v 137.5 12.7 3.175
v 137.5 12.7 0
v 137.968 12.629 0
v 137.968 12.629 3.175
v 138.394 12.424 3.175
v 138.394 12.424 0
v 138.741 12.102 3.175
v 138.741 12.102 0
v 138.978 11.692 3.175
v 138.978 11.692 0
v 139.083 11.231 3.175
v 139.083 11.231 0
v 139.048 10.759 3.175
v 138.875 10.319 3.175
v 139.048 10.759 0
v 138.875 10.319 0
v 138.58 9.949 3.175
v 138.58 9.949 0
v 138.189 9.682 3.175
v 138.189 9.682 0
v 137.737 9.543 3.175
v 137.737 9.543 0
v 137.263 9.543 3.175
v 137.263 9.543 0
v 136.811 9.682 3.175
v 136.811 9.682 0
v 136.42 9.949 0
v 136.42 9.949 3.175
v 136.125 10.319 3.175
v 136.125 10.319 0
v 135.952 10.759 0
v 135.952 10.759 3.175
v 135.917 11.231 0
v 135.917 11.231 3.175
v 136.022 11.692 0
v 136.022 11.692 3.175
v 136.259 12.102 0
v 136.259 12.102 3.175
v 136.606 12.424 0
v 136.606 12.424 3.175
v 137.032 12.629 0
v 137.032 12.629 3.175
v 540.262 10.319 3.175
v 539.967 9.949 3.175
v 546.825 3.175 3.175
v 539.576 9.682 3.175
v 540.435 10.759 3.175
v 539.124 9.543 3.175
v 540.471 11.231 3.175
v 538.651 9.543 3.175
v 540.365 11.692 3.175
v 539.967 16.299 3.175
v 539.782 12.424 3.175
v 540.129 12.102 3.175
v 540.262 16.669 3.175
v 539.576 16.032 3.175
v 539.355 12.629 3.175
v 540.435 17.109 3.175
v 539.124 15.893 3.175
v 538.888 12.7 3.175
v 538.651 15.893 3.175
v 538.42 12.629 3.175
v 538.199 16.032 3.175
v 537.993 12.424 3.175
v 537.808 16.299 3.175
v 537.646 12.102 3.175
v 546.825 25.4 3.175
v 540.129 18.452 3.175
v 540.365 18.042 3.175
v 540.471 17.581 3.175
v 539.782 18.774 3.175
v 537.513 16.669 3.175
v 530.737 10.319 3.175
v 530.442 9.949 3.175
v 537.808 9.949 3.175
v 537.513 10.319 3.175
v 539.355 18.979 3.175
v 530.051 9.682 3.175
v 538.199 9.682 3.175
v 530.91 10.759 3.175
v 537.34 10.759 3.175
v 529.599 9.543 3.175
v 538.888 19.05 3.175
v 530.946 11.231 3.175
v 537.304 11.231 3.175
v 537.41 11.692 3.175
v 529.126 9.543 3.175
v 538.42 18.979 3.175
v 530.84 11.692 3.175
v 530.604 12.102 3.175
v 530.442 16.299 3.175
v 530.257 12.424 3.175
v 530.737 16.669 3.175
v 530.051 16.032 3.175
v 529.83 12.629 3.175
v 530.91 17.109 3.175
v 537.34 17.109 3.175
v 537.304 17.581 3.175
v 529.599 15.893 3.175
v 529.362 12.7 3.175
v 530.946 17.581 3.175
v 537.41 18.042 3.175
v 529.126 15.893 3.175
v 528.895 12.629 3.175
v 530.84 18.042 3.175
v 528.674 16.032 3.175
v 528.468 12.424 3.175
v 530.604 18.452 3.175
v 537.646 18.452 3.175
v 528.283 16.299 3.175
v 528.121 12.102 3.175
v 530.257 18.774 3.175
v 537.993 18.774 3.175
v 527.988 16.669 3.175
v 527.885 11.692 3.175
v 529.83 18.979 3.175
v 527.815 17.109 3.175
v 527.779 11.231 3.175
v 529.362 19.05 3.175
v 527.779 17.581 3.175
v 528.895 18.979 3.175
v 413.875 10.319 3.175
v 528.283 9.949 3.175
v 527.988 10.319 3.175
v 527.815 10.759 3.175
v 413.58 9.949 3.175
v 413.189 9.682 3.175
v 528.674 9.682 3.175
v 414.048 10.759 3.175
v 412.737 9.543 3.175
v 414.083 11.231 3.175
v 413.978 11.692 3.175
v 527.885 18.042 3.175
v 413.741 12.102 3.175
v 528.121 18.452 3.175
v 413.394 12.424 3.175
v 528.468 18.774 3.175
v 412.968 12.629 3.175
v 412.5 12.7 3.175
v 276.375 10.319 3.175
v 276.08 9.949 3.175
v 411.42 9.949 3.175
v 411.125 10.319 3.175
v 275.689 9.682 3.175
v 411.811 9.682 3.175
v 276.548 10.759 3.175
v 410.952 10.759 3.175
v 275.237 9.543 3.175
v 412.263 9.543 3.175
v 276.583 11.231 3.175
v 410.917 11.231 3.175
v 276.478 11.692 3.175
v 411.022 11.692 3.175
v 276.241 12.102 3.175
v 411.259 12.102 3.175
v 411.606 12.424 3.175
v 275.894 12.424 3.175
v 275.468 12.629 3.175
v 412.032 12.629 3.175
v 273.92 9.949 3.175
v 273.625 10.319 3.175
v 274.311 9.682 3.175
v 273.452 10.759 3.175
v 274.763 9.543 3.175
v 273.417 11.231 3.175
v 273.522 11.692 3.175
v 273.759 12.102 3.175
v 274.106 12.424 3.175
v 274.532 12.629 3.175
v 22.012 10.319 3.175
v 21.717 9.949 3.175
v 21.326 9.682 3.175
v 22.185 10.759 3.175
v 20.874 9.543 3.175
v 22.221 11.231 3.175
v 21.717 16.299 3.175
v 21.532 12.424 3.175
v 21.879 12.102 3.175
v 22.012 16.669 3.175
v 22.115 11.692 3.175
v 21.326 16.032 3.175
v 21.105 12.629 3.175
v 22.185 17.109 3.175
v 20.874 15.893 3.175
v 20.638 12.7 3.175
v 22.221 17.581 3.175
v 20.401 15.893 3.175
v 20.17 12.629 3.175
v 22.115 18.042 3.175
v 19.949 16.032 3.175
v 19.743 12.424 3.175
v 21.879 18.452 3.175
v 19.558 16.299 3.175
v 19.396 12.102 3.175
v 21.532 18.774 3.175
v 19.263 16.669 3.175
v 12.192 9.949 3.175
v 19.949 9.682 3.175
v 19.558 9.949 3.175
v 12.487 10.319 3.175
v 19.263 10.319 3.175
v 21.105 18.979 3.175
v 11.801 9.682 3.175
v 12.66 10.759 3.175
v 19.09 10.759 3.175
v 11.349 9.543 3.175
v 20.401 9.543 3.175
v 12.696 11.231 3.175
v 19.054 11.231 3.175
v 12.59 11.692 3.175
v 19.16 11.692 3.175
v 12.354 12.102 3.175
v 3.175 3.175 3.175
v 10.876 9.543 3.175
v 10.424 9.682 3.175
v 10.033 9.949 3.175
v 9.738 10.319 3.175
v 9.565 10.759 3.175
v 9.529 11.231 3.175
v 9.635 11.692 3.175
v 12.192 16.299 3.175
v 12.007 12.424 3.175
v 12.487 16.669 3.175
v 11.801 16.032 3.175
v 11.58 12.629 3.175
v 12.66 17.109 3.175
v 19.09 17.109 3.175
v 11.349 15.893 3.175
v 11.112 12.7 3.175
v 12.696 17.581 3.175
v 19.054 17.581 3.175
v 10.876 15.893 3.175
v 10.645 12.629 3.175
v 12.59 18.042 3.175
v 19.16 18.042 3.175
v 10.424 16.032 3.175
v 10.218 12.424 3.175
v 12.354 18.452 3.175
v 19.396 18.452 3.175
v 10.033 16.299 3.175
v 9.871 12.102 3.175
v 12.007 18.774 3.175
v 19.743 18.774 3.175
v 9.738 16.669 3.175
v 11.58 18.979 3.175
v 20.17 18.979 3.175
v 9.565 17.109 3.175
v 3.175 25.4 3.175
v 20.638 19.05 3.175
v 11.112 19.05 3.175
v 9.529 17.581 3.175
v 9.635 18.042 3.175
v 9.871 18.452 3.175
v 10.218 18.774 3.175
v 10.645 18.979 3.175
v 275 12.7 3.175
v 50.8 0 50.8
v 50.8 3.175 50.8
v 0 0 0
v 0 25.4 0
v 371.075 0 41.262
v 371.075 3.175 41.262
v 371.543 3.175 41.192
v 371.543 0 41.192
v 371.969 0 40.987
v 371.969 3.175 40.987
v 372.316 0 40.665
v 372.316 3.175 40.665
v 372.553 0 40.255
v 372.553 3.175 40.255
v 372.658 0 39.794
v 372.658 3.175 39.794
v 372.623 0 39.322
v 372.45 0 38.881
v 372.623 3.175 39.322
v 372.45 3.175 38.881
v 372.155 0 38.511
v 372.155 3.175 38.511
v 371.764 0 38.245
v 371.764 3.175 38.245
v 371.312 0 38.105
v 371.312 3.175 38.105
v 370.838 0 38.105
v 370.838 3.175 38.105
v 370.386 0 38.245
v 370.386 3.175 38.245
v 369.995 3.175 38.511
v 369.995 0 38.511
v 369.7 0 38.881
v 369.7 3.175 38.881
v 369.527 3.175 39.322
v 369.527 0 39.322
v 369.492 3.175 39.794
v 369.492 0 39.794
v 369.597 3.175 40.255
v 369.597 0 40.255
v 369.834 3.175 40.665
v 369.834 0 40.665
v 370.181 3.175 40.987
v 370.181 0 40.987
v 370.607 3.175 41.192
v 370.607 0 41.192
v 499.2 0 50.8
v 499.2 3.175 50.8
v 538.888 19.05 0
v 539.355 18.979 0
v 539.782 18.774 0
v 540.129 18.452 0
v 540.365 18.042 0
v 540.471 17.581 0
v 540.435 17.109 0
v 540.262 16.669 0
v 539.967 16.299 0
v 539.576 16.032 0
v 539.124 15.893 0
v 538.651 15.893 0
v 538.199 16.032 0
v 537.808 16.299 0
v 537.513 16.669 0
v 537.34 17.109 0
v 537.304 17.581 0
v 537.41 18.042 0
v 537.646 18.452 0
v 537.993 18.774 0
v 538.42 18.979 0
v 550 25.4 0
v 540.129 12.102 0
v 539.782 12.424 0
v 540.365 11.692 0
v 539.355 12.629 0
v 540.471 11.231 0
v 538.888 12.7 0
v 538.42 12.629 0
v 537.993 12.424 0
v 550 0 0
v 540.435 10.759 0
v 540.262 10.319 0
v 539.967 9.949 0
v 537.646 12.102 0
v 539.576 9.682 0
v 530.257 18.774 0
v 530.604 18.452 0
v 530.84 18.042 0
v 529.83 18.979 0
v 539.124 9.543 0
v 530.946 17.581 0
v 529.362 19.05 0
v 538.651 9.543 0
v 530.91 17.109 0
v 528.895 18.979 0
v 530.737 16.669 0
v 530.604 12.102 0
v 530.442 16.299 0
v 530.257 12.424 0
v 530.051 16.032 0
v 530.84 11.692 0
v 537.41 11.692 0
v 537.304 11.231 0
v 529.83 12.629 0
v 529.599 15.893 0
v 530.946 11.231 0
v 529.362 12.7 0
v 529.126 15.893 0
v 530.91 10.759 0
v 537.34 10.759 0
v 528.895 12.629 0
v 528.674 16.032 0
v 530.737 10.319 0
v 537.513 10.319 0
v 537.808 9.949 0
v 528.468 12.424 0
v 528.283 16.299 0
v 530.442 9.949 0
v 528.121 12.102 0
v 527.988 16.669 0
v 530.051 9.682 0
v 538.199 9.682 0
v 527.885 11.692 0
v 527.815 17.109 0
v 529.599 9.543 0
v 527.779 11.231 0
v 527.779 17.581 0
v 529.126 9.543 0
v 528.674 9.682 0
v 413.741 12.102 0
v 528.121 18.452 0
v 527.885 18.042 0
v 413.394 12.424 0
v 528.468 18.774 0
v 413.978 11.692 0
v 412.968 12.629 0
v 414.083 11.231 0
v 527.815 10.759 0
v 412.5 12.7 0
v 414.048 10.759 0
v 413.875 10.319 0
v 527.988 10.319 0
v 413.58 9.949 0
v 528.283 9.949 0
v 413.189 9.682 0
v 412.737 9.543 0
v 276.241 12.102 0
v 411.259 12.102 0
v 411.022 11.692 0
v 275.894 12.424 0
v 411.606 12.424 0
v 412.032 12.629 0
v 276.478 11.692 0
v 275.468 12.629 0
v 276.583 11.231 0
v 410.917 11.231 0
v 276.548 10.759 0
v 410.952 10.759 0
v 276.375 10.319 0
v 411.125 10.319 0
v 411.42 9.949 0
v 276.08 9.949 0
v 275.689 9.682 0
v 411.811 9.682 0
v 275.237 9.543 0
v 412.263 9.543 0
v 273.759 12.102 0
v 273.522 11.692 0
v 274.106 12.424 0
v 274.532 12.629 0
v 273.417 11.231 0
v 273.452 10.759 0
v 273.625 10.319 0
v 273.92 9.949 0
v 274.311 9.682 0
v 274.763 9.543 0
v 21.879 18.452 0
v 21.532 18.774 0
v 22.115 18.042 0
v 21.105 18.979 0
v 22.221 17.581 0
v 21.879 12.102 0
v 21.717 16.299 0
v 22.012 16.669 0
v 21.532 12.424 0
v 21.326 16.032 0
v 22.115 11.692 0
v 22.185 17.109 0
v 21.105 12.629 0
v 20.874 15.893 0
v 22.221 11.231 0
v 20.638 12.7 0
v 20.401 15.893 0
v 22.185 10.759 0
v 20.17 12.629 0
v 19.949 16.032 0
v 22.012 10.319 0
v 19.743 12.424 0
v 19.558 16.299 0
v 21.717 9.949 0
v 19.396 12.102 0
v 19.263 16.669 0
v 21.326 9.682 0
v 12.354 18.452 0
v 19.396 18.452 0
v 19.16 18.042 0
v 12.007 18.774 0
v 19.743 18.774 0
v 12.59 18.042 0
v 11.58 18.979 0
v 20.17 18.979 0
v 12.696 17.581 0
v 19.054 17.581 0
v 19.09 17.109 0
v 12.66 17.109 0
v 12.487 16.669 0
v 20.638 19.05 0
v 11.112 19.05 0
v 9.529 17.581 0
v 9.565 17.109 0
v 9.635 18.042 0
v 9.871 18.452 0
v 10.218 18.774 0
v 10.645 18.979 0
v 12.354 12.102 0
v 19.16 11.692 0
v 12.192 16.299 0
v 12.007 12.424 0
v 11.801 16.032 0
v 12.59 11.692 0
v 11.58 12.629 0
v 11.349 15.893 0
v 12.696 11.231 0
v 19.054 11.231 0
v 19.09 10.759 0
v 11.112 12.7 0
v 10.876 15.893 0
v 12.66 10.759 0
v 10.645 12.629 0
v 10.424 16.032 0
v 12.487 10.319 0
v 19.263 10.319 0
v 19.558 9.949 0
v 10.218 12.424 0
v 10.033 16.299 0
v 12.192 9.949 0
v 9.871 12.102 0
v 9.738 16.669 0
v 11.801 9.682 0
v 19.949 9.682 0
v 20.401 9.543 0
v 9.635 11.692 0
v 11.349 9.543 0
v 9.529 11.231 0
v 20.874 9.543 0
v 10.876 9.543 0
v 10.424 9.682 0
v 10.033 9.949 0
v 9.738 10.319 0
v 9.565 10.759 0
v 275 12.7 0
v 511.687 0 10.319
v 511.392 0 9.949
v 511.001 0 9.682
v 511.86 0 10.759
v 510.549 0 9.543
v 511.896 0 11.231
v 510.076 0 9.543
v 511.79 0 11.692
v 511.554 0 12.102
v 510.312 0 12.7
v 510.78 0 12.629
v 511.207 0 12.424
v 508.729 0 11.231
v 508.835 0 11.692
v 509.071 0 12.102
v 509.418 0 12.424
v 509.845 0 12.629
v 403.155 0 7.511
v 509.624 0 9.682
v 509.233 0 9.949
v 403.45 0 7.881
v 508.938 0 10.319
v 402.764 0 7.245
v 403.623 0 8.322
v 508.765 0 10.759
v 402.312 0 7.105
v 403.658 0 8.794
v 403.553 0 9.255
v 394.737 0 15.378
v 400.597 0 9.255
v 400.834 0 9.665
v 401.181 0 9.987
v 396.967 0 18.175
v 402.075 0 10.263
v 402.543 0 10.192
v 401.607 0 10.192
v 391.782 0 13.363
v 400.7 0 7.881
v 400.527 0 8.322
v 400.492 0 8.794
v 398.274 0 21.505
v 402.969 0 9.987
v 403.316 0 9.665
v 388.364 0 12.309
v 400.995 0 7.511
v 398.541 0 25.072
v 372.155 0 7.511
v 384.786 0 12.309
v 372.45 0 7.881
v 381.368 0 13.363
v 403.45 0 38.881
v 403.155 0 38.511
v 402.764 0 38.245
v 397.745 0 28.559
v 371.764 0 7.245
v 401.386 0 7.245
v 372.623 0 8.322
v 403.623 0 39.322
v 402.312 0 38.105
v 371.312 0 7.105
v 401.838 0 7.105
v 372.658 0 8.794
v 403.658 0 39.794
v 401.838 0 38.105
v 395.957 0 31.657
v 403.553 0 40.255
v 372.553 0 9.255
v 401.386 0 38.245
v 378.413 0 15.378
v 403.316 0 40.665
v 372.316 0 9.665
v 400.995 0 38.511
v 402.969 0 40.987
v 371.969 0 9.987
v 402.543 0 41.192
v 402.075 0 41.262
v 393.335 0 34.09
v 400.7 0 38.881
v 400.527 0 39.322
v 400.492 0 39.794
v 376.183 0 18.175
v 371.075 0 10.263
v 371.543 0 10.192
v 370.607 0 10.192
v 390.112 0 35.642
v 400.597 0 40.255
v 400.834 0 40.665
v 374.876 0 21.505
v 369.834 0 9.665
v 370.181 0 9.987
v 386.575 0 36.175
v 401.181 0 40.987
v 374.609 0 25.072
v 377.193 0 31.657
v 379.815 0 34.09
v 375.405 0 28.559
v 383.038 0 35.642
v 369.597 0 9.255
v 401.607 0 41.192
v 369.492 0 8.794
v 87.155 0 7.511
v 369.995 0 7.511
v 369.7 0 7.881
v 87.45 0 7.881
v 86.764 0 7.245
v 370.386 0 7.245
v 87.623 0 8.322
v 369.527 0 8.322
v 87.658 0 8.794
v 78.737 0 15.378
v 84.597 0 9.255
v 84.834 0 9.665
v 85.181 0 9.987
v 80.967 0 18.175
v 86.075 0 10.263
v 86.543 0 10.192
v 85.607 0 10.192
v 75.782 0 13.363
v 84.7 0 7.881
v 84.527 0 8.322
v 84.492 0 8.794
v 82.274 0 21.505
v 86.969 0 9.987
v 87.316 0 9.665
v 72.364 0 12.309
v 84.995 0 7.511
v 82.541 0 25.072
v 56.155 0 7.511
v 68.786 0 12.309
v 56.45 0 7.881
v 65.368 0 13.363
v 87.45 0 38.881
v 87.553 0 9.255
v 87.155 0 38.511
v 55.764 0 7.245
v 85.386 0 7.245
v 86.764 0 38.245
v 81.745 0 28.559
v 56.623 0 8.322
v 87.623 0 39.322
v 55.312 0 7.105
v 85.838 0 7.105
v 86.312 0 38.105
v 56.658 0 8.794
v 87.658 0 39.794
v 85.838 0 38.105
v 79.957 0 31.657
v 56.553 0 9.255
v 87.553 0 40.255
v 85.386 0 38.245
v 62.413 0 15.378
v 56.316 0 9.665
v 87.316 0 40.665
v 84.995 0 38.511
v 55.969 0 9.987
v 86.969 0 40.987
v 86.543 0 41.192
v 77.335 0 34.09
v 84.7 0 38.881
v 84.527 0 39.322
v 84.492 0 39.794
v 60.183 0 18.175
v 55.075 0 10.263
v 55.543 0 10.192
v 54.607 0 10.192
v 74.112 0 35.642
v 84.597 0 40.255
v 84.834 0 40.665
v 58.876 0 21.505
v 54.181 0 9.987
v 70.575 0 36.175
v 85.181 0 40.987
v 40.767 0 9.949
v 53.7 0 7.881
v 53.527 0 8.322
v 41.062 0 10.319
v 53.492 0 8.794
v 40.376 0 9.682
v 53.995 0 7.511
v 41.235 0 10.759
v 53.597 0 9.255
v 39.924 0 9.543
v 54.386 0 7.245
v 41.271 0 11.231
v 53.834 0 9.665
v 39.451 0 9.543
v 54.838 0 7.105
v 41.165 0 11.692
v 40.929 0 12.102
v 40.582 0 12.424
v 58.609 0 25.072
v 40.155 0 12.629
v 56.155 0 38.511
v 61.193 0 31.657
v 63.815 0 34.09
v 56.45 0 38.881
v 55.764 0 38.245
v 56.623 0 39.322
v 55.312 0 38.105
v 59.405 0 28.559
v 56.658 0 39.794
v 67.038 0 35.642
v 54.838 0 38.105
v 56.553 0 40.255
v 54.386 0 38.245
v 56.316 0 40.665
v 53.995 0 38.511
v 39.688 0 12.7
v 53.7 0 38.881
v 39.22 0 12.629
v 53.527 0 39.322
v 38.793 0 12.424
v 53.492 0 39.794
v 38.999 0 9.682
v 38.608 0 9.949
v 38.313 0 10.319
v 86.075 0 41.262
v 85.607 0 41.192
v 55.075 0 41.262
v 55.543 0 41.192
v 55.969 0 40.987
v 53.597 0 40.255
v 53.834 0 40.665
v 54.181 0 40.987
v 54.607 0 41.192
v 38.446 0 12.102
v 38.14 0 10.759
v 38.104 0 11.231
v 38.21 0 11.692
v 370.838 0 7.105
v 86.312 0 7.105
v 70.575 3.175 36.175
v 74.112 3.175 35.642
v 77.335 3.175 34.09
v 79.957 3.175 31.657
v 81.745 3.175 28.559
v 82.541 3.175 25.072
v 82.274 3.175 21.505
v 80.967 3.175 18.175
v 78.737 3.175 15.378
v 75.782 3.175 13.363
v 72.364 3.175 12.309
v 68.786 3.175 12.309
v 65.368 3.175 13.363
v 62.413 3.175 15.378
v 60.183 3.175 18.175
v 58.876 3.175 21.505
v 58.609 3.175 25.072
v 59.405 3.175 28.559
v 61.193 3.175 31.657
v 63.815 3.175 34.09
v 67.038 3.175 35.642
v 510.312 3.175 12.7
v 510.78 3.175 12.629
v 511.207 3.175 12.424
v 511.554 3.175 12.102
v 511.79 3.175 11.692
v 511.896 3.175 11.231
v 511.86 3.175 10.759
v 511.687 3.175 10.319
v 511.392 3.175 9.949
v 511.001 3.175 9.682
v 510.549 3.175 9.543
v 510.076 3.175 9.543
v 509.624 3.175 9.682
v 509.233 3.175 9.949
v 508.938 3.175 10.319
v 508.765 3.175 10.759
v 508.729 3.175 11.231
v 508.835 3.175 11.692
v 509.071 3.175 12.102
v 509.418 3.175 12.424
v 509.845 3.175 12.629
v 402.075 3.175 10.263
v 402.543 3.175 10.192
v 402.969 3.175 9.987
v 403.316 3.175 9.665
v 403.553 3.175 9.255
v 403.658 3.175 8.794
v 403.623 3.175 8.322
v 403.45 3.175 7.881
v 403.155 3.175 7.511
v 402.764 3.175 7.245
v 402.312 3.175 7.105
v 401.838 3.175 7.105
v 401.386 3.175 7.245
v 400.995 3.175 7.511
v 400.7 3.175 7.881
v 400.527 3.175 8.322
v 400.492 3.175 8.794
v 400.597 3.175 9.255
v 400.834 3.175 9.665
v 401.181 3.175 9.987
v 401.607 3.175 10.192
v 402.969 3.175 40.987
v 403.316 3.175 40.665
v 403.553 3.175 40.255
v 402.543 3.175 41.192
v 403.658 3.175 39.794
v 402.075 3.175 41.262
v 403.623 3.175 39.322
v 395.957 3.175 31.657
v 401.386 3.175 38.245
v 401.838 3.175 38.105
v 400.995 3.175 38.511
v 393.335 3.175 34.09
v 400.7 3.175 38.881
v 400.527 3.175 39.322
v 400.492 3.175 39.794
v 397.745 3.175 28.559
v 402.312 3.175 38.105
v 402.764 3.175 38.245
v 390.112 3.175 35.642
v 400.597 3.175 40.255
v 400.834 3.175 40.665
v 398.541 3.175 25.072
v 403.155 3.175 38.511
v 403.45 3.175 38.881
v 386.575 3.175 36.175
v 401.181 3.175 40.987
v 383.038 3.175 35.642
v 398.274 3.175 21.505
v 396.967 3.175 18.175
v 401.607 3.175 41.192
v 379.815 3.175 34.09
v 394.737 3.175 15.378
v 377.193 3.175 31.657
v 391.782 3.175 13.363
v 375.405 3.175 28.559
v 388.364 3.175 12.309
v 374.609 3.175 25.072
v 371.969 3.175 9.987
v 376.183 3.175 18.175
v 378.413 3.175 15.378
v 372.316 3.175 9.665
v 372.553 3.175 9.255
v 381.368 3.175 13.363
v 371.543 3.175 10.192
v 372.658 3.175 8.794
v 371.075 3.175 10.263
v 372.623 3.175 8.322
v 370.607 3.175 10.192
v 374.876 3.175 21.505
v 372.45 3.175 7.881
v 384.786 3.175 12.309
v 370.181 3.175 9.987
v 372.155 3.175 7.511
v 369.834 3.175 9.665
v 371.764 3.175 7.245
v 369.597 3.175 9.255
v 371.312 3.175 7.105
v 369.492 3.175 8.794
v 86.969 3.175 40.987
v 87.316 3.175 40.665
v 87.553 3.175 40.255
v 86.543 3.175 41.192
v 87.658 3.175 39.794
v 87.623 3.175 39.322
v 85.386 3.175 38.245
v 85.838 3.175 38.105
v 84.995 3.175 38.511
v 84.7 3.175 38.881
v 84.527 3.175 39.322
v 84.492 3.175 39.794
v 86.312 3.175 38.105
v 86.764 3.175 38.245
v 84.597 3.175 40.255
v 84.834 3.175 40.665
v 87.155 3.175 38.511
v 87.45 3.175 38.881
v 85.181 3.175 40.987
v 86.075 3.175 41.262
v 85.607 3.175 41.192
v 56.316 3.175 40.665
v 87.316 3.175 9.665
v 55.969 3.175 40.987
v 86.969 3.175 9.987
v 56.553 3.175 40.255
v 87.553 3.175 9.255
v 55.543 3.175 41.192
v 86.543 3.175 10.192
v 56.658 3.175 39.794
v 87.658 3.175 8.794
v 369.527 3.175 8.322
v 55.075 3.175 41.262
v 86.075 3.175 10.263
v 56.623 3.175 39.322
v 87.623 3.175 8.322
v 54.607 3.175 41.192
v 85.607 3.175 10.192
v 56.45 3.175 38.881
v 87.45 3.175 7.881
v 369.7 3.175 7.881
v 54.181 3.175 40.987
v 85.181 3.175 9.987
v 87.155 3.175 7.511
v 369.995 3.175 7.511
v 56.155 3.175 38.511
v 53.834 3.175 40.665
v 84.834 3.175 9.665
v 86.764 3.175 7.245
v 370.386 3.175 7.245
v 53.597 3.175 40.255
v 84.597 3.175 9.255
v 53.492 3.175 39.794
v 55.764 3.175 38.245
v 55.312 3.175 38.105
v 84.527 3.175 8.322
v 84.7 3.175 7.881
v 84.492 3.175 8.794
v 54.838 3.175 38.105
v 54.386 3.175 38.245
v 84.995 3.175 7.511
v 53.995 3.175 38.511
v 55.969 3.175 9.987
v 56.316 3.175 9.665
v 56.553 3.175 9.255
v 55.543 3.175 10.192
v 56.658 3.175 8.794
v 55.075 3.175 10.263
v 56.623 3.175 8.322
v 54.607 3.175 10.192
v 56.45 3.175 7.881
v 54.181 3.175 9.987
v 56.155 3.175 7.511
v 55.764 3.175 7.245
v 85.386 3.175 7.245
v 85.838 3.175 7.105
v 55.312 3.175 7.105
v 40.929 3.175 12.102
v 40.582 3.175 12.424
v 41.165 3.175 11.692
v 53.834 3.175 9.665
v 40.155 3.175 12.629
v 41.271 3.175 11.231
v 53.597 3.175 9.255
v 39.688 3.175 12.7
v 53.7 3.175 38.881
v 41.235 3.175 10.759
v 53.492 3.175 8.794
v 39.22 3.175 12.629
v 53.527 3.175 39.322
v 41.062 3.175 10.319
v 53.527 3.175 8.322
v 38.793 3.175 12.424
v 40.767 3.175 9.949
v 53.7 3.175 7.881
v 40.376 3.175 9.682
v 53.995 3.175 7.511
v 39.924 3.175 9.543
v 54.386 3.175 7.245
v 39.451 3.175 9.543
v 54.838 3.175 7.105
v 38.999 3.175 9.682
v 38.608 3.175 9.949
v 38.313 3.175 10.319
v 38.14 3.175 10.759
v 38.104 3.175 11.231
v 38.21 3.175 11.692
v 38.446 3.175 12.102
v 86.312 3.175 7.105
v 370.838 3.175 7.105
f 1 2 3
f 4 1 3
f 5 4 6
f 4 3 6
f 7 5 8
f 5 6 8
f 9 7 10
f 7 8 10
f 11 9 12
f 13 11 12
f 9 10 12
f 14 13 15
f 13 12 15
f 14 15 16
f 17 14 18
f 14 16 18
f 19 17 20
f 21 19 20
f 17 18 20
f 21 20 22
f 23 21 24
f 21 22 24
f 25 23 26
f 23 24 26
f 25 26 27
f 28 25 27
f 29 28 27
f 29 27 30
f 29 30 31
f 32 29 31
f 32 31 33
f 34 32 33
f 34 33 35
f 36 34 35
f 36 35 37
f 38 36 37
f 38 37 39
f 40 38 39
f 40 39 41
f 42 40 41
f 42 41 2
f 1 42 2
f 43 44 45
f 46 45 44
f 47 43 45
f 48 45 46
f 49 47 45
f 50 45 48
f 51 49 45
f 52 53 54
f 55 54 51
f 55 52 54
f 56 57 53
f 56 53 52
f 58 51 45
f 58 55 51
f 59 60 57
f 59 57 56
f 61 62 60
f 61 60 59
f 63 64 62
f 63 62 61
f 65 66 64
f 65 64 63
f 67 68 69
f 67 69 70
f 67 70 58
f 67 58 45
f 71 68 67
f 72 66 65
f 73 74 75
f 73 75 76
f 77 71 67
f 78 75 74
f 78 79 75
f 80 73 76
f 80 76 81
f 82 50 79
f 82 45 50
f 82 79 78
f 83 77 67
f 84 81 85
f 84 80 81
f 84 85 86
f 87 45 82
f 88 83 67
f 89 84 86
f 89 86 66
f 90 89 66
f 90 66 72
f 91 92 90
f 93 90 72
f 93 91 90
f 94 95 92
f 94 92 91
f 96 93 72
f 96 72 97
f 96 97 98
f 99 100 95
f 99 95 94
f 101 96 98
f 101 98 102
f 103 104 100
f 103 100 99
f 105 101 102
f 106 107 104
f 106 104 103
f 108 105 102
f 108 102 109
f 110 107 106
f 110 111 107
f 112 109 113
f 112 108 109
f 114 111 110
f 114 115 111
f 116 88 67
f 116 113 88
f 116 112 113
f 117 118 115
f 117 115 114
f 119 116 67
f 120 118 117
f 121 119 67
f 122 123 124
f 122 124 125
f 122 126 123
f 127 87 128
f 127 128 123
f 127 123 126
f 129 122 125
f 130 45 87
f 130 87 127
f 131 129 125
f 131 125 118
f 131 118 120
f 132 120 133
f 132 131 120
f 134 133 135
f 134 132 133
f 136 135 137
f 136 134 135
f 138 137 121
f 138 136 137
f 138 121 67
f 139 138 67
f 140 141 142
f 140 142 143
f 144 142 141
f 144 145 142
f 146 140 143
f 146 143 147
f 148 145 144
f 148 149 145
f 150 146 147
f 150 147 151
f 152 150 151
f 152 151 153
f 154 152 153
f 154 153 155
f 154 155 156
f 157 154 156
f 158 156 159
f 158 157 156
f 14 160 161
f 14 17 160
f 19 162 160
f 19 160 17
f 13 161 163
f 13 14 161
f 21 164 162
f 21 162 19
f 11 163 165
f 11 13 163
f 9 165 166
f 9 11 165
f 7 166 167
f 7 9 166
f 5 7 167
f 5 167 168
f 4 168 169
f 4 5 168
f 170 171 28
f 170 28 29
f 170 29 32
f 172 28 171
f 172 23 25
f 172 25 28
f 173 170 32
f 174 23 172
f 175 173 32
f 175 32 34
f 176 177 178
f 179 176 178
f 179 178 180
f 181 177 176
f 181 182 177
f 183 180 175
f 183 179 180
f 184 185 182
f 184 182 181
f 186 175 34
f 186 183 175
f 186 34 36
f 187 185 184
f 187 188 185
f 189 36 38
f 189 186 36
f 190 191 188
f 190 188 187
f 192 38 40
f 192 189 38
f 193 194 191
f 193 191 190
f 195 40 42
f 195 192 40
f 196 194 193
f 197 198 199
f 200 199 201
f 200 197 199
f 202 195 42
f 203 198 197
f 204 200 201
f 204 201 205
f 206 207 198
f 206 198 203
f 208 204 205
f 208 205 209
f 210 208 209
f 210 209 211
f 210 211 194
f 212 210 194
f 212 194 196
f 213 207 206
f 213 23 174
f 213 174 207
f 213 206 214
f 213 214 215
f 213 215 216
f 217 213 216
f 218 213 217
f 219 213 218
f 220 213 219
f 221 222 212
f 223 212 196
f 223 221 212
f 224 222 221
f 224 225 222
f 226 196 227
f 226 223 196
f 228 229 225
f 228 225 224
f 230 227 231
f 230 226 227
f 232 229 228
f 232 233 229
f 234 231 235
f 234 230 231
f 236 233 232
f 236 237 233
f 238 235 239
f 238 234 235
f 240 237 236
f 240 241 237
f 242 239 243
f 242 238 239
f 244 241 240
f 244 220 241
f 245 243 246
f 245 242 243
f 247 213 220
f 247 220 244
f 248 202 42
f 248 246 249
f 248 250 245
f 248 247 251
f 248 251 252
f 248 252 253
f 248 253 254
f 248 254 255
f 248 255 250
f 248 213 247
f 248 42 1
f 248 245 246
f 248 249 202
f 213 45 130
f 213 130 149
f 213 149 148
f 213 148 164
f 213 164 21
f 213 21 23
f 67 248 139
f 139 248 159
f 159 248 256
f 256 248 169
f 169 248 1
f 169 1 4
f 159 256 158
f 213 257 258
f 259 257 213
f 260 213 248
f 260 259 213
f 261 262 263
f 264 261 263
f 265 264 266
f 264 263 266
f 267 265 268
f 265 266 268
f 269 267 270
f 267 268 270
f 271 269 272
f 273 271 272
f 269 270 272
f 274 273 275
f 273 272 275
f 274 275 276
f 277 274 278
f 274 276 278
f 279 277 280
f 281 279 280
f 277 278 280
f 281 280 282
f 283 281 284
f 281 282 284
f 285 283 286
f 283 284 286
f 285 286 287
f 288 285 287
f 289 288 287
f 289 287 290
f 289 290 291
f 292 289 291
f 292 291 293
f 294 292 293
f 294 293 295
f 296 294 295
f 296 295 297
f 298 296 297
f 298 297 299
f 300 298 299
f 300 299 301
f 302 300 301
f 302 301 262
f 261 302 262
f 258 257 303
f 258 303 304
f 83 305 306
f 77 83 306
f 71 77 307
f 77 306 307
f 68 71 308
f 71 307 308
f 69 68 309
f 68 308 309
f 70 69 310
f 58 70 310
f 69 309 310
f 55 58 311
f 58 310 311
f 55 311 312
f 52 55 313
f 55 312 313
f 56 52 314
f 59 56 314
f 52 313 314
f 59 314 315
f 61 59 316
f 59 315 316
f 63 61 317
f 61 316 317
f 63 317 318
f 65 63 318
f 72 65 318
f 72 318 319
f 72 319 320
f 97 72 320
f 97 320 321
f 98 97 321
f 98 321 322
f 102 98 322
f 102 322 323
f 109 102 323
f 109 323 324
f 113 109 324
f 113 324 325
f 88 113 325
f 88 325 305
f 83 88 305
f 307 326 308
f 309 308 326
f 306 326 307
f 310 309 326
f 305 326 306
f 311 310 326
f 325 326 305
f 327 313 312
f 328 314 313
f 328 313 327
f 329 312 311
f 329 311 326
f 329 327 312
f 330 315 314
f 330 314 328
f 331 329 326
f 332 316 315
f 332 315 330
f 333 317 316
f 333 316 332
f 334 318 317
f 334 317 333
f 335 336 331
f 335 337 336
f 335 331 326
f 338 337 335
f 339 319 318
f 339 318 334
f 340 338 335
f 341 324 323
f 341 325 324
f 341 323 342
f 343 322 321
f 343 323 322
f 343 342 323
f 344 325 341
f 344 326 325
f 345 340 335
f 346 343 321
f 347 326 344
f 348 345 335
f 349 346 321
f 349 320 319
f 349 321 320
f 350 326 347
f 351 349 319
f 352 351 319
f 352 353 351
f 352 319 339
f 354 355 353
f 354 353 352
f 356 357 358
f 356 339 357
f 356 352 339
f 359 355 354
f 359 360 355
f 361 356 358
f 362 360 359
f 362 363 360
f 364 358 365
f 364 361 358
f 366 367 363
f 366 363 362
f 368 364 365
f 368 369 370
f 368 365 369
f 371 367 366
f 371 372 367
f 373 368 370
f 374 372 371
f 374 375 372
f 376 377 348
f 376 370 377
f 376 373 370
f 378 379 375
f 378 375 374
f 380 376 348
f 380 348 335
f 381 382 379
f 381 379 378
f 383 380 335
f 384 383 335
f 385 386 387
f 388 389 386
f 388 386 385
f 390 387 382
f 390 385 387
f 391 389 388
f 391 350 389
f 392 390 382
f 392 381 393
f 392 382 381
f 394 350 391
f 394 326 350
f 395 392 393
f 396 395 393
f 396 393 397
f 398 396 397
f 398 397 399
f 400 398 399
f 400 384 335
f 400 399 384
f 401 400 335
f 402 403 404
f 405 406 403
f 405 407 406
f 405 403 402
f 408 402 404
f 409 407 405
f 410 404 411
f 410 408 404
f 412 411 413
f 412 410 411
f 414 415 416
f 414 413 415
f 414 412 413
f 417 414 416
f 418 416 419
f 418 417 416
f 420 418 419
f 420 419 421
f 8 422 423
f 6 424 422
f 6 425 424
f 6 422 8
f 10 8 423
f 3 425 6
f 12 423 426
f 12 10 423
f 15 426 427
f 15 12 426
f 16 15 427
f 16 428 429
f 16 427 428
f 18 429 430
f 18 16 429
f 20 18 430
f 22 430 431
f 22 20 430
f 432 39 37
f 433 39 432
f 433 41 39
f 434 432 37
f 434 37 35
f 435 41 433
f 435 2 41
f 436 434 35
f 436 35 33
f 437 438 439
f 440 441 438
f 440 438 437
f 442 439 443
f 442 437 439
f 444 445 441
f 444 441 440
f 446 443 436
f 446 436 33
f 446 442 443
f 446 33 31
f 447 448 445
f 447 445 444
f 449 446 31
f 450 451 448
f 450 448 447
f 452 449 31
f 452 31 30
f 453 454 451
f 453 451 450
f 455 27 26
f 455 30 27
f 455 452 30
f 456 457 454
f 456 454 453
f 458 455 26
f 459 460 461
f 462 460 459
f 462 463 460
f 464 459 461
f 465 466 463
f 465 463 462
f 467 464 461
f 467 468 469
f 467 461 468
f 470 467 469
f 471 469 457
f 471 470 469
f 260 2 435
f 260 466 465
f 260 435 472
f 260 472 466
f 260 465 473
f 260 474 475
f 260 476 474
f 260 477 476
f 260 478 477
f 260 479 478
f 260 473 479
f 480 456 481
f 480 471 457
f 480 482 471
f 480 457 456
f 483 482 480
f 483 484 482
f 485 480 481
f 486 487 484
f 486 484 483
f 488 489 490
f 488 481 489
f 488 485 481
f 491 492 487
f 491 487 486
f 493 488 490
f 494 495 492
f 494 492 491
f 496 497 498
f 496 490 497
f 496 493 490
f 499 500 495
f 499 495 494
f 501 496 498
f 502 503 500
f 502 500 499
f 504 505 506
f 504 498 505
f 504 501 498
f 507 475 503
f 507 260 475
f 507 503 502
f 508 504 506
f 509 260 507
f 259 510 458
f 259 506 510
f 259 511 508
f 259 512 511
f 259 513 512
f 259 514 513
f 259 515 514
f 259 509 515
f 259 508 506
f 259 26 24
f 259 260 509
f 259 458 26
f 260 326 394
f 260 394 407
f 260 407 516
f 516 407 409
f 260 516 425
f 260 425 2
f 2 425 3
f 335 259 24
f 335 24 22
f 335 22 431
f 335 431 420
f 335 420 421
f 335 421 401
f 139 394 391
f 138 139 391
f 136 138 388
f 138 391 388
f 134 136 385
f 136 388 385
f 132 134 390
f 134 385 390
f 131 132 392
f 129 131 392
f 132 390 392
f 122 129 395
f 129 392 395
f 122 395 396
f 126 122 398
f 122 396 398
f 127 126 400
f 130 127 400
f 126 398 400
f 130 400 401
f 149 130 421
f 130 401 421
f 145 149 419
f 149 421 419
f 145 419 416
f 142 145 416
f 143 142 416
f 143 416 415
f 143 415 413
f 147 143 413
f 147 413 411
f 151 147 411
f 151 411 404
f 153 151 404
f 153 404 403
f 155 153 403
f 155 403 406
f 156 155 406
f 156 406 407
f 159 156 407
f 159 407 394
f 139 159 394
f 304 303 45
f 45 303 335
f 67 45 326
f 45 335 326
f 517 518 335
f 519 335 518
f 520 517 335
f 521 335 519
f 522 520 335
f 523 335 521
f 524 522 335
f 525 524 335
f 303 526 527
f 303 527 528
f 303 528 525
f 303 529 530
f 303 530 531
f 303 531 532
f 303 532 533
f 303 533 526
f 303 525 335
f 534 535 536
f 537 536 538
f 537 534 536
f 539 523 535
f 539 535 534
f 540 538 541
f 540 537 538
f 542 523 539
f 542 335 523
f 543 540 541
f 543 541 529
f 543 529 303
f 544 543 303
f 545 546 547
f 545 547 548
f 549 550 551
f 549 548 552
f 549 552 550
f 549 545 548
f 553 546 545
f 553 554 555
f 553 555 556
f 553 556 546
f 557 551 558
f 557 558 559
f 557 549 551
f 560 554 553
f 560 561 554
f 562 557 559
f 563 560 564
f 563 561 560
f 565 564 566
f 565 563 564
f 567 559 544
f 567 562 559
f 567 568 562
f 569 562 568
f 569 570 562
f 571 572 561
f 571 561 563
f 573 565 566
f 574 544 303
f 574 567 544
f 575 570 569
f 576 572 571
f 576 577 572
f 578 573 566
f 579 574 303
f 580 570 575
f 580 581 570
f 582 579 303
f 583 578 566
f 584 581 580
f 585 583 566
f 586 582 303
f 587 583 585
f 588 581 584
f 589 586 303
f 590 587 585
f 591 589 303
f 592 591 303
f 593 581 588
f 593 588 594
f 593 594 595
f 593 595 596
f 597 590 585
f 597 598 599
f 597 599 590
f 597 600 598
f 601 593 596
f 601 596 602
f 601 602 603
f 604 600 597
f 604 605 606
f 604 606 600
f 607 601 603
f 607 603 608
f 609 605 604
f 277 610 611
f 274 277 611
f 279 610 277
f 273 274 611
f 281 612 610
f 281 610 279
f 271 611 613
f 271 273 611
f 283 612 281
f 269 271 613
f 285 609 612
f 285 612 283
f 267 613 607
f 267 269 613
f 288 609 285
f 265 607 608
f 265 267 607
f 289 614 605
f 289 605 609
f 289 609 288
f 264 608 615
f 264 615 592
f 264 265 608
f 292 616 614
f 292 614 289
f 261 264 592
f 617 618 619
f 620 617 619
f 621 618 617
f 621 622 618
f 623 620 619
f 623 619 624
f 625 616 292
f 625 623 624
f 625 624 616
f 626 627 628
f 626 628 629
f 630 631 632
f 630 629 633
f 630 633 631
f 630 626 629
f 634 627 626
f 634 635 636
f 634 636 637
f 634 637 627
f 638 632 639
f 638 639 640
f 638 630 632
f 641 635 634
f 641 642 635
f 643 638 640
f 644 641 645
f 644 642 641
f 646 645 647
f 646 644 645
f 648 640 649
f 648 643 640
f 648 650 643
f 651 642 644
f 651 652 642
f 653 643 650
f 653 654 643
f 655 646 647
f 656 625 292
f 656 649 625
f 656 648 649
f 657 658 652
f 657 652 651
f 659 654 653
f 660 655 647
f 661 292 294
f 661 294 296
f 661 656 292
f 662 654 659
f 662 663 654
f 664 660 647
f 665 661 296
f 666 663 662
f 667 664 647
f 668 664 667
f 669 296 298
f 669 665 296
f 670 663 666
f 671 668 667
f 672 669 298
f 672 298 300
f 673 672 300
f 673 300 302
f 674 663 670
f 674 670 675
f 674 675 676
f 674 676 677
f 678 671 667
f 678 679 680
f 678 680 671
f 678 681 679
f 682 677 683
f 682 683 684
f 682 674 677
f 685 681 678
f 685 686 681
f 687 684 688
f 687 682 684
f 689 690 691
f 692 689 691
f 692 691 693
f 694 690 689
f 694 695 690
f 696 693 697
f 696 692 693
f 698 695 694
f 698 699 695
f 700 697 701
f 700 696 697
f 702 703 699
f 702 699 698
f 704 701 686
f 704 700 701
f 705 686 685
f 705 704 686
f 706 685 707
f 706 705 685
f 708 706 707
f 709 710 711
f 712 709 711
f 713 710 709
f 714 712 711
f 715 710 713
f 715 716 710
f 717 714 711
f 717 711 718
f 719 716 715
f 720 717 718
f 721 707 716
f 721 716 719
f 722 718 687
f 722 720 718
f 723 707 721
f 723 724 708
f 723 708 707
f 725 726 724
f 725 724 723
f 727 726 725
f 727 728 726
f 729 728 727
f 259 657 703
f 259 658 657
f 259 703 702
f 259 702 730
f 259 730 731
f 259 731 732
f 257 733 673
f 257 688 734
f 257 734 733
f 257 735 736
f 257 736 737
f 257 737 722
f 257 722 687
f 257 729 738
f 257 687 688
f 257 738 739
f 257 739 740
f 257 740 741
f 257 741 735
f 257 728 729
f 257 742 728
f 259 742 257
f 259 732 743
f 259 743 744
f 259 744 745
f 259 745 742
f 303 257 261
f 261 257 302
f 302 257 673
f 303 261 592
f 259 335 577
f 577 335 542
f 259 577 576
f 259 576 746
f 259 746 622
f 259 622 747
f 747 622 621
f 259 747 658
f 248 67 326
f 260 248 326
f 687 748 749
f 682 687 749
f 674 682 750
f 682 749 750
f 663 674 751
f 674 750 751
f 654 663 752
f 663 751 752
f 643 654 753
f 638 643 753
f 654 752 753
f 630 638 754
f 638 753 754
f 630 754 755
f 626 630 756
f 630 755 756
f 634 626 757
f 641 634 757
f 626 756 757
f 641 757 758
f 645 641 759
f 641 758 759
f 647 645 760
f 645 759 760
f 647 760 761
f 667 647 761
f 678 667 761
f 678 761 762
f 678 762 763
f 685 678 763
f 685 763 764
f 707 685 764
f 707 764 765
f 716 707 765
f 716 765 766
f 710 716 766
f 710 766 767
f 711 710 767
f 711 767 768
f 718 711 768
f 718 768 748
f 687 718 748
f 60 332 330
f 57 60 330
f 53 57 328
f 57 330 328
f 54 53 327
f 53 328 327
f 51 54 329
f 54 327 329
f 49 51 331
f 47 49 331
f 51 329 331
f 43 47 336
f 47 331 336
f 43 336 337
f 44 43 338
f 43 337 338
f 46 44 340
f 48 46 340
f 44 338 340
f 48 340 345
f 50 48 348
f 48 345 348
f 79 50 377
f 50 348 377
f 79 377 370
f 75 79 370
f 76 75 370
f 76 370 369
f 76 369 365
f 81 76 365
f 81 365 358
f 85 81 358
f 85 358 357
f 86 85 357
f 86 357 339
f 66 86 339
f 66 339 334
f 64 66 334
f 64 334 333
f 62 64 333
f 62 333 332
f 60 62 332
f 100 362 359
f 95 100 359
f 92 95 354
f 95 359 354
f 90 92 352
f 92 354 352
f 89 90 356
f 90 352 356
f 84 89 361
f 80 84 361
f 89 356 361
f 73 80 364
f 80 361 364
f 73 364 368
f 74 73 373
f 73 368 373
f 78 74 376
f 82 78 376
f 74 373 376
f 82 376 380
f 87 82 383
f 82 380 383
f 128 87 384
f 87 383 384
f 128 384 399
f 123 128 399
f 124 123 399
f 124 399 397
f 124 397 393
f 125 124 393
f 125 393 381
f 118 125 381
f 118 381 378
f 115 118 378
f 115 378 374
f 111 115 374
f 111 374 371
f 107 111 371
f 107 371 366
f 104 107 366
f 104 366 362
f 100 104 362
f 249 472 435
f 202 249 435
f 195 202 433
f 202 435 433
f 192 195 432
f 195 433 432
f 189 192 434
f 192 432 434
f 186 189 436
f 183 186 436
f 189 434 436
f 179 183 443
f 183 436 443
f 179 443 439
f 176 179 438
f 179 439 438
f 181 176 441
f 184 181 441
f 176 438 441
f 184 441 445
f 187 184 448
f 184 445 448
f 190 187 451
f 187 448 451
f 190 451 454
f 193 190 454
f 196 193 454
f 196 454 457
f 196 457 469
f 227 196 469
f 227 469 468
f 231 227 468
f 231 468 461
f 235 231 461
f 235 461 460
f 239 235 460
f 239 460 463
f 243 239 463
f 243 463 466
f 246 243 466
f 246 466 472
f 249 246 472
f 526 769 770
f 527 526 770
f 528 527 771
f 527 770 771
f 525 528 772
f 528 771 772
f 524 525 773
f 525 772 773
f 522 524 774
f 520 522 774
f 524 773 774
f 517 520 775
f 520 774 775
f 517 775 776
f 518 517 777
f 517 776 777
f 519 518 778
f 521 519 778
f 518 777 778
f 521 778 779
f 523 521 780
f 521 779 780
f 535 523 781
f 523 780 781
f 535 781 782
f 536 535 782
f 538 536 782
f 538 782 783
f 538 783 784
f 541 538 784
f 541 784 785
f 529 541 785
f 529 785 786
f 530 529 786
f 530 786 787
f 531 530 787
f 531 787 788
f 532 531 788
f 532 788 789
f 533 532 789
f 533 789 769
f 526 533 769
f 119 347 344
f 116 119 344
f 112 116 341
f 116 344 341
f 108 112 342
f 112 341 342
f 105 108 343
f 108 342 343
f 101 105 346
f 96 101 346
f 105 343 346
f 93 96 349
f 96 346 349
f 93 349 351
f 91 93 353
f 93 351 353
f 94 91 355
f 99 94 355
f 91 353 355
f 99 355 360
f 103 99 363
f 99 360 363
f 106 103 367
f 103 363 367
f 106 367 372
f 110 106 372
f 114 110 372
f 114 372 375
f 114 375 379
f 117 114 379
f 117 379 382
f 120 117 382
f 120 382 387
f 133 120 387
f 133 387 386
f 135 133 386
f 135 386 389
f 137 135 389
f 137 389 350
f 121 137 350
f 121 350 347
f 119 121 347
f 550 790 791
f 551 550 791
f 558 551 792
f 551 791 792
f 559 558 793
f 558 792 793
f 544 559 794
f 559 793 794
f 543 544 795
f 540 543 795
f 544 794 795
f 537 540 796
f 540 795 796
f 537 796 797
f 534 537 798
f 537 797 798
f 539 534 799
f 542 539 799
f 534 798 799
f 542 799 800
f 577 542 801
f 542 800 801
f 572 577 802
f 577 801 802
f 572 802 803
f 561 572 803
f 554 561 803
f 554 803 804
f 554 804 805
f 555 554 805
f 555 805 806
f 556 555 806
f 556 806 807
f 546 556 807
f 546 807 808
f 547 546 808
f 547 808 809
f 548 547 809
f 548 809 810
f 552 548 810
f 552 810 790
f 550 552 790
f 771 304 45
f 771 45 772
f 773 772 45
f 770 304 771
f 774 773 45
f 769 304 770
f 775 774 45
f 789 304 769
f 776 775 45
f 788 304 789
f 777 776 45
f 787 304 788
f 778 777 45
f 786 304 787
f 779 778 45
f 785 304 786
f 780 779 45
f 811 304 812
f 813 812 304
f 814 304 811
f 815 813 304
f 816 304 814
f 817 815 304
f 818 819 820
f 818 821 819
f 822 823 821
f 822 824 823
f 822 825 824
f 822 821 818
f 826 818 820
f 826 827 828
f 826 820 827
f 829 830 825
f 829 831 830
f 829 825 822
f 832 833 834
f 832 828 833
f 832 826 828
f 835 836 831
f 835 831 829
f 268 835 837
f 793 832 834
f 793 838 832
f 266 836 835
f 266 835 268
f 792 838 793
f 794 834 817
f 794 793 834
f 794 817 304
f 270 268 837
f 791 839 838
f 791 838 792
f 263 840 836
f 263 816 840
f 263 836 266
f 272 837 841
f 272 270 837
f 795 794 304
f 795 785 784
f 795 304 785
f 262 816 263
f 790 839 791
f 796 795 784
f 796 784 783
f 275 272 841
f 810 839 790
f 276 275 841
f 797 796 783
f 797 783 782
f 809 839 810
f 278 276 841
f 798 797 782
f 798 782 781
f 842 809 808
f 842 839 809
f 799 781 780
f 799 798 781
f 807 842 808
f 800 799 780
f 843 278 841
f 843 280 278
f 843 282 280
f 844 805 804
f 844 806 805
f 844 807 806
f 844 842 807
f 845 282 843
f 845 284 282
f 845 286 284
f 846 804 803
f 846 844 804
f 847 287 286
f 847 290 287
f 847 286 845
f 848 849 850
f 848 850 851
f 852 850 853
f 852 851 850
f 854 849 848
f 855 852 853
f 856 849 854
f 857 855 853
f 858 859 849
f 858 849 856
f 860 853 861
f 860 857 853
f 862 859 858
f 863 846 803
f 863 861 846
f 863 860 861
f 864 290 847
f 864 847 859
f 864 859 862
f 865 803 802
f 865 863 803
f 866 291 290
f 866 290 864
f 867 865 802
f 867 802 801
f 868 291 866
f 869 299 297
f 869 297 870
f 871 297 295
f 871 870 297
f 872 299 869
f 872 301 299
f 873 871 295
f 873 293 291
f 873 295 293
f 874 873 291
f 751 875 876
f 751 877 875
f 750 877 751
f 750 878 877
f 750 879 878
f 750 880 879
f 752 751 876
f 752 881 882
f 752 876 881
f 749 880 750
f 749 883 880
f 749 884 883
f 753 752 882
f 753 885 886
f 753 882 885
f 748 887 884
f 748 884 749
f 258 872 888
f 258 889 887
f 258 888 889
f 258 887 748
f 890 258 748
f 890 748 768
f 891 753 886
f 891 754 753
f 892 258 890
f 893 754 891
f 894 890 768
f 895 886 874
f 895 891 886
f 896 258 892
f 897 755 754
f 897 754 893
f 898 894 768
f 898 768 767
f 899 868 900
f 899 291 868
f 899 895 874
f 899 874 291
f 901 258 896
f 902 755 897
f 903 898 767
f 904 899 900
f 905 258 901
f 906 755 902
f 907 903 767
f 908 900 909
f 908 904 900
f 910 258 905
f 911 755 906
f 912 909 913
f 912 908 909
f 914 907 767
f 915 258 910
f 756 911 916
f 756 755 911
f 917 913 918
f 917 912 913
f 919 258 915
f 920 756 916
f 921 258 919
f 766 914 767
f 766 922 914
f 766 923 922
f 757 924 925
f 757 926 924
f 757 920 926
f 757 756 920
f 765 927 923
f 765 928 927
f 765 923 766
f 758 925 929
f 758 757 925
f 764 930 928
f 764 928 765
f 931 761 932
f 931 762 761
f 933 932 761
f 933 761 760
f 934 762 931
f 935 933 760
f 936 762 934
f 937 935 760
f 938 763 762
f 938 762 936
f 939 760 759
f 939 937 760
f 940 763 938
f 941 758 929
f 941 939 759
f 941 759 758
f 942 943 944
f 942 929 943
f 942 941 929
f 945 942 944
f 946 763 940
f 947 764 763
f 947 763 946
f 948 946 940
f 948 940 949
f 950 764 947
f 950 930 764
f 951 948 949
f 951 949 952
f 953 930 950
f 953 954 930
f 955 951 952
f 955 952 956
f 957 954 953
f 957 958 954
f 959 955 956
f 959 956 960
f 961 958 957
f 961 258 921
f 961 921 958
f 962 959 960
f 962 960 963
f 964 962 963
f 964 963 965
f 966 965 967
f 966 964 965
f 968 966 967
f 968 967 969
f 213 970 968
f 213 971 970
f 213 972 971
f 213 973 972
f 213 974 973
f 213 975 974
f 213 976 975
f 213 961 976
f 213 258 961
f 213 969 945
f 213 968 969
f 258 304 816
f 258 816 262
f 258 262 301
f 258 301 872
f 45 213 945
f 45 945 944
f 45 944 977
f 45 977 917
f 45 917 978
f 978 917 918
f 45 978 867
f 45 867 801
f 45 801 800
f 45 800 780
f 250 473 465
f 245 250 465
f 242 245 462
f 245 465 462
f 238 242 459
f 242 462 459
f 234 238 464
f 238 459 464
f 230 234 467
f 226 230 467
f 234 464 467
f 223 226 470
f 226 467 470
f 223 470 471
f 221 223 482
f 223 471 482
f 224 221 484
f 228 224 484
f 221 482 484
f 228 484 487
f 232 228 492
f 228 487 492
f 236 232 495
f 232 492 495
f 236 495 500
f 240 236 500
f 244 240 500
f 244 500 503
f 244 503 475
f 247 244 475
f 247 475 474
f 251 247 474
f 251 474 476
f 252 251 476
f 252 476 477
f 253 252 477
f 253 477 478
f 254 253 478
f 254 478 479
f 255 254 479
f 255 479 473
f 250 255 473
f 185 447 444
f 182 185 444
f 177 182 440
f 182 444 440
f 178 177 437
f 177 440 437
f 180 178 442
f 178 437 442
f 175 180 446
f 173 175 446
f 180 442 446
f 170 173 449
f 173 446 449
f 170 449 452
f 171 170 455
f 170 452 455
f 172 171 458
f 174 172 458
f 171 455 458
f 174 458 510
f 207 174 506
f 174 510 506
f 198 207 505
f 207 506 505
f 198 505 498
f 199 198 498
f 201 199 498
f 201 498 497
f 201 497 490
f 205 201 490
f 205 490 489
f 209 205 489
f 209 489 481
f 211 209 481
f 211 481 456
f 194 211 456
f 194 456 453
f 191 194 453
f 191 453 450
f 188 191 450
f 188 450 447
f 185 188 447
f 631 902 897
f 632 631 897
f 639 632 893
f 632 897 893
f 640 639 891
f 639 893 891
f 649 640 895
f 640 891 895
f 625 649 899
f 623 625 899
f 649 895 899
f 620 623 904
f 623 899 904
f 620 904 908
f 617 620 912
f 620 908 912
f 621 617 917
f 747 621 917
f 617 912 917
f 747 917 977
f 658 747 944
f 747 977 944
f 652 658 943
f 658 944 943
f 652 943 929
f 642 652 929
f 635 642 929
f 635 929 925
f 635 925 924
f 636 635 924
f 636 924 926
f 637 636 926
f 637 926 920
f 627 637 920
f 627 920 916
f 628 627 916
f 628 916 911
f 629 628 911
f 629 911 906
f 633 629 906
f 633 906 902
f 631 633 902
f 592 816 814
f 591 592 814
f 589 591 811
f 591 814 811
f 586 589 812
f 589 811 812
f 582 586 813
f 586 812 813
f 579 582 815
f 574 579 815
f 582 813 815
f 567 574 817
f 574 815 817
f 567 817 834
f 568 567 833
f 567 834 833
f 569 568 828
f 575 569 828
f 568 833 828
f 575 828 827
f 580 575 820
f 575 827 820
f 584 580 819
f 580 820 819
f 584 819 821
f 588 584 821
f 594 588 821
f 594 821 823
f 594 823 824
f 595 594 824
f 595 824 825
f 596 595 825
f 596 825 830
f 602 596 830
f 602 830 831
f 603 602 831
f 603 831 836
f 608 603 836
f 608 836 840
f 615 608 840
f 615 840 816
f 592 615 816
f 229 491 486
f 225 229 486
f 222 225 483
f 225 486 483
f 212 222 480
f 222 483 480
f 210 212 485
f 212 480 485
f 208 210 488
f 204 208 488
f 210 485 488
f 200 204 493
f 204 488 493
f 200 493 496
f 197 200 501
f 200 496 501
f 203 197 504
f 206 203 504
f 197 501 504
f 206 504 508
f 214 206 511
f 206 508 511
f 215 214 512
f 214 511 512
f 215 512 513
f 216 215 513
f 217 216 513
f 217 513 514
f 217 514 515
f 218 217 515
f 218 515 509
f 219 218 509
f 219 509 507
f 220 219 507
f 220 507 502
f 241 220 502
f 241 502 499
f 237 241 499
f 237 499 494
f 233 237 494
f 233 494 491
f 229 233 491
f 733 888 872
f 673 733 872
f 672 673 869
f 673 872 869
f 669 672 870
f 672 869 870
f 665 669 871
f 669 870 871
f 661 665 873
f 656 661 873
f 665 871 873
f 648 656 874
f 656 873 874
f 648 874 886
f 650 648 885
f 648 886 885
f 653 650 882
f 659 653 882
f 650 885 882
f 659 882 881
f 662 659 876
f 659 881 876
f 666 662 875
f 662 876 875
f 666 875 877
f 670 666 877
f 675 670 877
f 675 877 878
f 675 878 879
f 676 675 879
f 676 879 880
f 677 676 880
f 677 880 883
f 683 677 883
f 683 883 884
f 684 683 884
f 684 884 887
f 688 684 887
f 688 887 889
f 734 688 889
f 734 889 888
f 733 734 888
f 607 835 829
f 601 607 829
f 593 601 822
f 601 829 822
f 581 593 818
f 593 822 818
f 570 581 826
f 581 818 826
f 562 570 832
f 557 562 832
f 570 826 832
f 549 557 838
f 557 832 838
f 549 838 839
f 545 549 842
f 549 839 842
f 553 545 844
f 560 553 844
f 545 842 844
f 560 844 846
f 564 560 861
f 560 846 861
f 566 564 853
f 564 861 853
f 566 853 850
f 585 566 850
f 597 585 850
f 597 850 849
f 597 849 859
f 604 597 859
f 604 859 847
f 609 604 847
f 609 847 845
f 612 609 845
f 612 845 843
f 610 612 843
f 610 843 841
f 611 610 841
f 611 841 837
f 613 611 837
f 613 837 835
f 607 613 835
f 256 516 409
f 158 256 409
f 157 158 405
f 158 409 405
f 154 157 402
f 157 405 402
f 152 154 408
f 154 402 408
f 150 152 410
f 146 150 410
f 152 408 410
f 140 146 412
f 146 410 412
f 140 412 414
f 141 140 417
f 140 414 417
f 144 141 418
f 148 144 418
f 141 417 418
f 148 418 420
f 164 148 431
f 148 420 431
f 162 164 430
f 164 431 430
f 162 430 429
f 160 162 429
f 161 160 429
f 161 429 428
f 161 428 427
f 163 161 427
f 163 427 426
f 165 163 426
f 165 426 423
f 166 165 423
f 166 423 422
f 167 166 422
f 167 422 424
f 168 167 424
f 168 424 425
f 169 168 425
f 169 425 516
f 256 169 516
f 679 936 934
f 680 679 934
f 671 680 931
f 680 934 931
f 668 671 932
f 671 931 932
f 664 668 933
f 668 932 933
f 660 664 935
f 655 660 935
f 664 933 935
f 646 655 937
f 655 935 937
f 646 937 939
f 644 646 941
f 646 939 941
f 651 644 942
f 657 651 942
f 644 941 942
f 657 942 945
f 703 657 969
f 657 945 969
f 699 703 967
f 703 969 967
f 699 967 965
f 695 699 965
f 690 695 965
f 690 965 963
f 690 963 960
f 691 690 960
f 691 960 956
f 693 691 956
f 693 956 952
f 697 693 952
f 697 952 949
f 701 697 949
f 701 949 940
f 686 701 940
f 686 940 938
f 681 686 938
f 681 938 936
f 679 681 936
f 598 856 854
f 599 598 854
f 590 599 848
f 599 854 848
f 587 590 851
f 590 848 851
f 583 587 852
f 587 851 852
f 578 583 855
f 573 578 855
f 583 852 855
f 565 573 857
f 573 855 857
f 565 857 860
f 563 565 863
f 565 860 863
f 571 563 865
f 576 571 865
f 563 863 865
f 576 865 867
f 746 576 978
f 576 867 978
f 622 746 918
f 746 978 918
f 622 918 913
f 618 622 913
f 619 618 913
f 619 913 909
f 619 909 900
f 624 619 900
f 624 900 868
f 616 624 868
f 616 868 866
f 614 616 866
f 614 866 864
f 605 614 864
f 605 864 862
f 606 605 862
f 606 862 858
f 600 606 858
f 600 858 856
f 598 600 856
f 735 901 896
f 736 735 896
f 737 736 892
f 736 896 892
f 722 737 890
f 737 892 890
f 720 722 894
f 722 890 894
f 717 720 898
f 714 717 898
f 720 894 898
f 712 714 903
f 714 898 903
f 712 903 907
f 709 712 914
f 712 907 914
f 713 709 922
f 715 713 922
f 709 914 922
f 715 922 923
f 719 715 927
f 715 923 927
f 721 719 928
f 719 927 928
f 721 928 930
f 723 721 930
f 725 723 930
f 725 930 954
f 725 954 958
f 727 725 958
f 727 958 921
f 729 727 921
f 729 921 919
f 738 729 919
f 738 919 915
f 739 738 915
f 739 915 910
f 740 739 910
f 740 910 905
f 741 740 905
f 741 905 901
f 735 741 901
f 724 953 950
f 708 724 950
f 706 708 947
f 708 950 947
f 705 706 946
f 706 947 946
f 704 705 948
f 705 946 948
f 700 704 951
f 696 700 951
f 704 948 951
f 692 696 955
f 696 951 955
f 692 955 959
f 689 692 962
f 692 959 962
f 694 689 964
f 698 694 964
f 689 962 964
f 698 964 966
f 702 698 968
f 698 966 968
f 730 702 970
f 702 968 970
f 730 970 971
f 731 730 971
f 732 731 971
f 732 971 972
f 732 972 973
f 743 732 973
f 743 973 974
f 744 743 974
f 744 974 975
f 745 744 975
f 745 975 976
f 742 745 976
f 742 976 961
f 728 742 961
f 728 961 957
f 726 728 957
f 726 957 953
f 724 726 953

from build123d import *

# Parameters (mm, degrees)
BOSS_EXTRUDE1_DEPTH              = 550
CHAMFER7_SIZE                    = 50.8
CHAMFER8_SIZE                    = 50.8
BOTTHOMHOLES_SKETCH2_R           = 12
BOTTHOMHOLES_SKETCH2_R_2         = 1.5875
BOTTOMHOLES_CUT_EXTRUDE1_DEPTH   = 553.788015993
LEFTSIDEHOLES_SKETCH3_R          = 1.5875
LEFTSIDEHOLES_CUT_EXTRUDE2_DEPTH = 553.924768843


with BuildPart() as part:
    # Sketch1 → Boss-Extrude1 (new body)
    with BuildSketch(Plane(origin=(0, 0, 0), x_dir=(0, 0, -1), z_dir=(1, 0, 0))):
        Polygon((0, 0), (-50.8, 0), (-50.8, 3.175), (-3.175, 3.175), (-3.175, 25.4), (0, 25.4), align=None)
    extrude(amount=BOSS_EXTRUDE1_DEPTH)

    # Chamfer7
    chamfer7_edges = [part.edges().sort_by_distance(p)[0] for p in [
        (0, 1.5875, 50.8),
    ]]
    chamfer(chamfer7_edges, length=CHAMFER7_SIZE - 0.0001)  # a hair under: the kernel refuses the full size

    # Chamfer8
    chamfer8_edges = [part.edges().sort_by_distance(p)[0] for p in [
        (550, 1.5875, 50.8),
    ]]
    chamfer(chamfer8_edges, length=CHAMFER8_SIZE - 0.0001)  # a hair under: the kernel refuses the full size

    # BotthomHoles-Sketch2 → BottomHoles-Cut-Extrude1 (cut, through all)
    with BuildSketch(Plane(origin=(0, 3.175, 0), x_dir=(1, 0, 0), z_dir=(0, 1, 0))):
        with Locations(Location((70.575, -24.175, 0), (0, 0, 270))):
            Circle(BOTTHOMHOLES_SKETCH2_R)
        with Locations(Location((386.575, -24.175, 0), (0, 0, 270))):
            Circle(BOTTHOMHOLES_SKETCH2_R)
        with Locations(Location((55.075, -8.675, 0), (0, 0, 270))):
            Circle(BOTTHOMHOLES_SKETCH2_R_2)
        with Locations(Location((86.075, -8.675, 0), (0, 0, 270))):
            Circle(BOTTHOMHOLES_SKETCH2_R_2)
        with Locations(Location((371.075, -8.675, 0), (0, 0, 270))):
            Circle(BOTTHOMHOLES_SKETCH2_R_2)
        with Locations(Location((402.075, -8.675, 0), (0, 0, 270))):
            Circle(BOTTHOMHOLES_SKETCH2_R_2)
        with Locations(Location((55.075, -39.675, 0), (0, 0, 270))):
            Circle(BOTTHOMHOLES_SKETCH2_R_2)
        with Locations(Location((86.075, -39.675, 0), (0, 0, 270))):
            Circle(BOTTHOMHOLES_SKETCH2_R_2)
        with Locations(Location((371.075, -39.675, 0), (0, 0, 270))):
            Circle(BOTTHOMHOLES_SKETCH2_R_2)
        with Locations(Location((402.075, -39.675, 0), (0, 0, 270))):
            Circle(BOTTHOMHOLES_SKETCH2_R_2)
        with Locations(Location((39.6875, -11.1125, 0), (0, 0, 270))):
            Circle(BOTTHOMHOLES_SKETCH2_R_2)
        with Locations(Location((510.3125, -11.1125, 0), (0, 0, 270))):
            Circle(BOTTHOMHOLES_SKETCH2_R_2)
    extrude(amount=-BOTTOMHOLES_CUT_EXTRUDE1_DEPTH, mode=Mode.SUBTRACT)

    # LeftSideHoles-Sketch3 → LeftSideHoles-Cut-Extrude2 (cut, through all)
    with BuildSketch(Plane(origin=(0, 0, 0), x_dir=(-1, 0, 0), z_dir=(0, 0, -1))):
        with Locations(Location((-538.8875, 17.4625, 0), (0, 0, 90))):
            Circle(LEFTSIDEHOLES_SKETCH3_R)
        with Locations(Location((-529.3625, 17.4625, 0), (0, 0, 90))):
            Circle(LEFTSIDEHOLES_SKETCH3_R)
        with Locations(Location((-538.8875, 11.1125, 0), (0, 0, 90))):
            Circle(LEFTSIDEHOLES_SKETCH3_R)
        with Locations(Location((-529.3625, 11.1125, 0), (0, 0, 90))):
            Circle(LEFTSIDEHOLES_SKETCH3_R)
        with Locations(Location((-11.1125, 11.1125, 0), (0, 0, 90))):
            Circle(LEFTSIDEHOLES_SKETCH3_R)
        with Locations(Location((-20.6375, 11.1125, 0), (0, 0, 90))):
            Circle(LEFTSIDEHOLES_SKETCH3_R)
        with Locations(Location((-20.6375, 17.4625, 0), (0, 0, 90))):
            Circle(LEFTSIDEHOLES_SKETCH3_R)
        with Locations(Location((-11.1125, 17.4625, 0), (0, 0, 90))):
            Circle(LEFTSIDEHOLES_SKETCH3_R)
        with Locations(Location((-412.5, 11.1125, 0), (0, 0, 90))):
            Circle(LEFTSIDEHOLES_SKETCH3_R)
        with Locations(Location((-275, 11.1125, 0), (0, 0, 90))):
            Circle(LEFTSIDEHOLES_SKETCH3_R)
        with Locations(Location((-137.5, 11.1125, 0), (0, 0, 90))):
            Circle(LEFTSIDEHOLES_SKETCH3_R)
    extrude(amount=-LEFTSIDEHOLES_CUT_EXTRUDE2_DEPTH, mode=Mode.SUBTRACT)


solid = part.part
